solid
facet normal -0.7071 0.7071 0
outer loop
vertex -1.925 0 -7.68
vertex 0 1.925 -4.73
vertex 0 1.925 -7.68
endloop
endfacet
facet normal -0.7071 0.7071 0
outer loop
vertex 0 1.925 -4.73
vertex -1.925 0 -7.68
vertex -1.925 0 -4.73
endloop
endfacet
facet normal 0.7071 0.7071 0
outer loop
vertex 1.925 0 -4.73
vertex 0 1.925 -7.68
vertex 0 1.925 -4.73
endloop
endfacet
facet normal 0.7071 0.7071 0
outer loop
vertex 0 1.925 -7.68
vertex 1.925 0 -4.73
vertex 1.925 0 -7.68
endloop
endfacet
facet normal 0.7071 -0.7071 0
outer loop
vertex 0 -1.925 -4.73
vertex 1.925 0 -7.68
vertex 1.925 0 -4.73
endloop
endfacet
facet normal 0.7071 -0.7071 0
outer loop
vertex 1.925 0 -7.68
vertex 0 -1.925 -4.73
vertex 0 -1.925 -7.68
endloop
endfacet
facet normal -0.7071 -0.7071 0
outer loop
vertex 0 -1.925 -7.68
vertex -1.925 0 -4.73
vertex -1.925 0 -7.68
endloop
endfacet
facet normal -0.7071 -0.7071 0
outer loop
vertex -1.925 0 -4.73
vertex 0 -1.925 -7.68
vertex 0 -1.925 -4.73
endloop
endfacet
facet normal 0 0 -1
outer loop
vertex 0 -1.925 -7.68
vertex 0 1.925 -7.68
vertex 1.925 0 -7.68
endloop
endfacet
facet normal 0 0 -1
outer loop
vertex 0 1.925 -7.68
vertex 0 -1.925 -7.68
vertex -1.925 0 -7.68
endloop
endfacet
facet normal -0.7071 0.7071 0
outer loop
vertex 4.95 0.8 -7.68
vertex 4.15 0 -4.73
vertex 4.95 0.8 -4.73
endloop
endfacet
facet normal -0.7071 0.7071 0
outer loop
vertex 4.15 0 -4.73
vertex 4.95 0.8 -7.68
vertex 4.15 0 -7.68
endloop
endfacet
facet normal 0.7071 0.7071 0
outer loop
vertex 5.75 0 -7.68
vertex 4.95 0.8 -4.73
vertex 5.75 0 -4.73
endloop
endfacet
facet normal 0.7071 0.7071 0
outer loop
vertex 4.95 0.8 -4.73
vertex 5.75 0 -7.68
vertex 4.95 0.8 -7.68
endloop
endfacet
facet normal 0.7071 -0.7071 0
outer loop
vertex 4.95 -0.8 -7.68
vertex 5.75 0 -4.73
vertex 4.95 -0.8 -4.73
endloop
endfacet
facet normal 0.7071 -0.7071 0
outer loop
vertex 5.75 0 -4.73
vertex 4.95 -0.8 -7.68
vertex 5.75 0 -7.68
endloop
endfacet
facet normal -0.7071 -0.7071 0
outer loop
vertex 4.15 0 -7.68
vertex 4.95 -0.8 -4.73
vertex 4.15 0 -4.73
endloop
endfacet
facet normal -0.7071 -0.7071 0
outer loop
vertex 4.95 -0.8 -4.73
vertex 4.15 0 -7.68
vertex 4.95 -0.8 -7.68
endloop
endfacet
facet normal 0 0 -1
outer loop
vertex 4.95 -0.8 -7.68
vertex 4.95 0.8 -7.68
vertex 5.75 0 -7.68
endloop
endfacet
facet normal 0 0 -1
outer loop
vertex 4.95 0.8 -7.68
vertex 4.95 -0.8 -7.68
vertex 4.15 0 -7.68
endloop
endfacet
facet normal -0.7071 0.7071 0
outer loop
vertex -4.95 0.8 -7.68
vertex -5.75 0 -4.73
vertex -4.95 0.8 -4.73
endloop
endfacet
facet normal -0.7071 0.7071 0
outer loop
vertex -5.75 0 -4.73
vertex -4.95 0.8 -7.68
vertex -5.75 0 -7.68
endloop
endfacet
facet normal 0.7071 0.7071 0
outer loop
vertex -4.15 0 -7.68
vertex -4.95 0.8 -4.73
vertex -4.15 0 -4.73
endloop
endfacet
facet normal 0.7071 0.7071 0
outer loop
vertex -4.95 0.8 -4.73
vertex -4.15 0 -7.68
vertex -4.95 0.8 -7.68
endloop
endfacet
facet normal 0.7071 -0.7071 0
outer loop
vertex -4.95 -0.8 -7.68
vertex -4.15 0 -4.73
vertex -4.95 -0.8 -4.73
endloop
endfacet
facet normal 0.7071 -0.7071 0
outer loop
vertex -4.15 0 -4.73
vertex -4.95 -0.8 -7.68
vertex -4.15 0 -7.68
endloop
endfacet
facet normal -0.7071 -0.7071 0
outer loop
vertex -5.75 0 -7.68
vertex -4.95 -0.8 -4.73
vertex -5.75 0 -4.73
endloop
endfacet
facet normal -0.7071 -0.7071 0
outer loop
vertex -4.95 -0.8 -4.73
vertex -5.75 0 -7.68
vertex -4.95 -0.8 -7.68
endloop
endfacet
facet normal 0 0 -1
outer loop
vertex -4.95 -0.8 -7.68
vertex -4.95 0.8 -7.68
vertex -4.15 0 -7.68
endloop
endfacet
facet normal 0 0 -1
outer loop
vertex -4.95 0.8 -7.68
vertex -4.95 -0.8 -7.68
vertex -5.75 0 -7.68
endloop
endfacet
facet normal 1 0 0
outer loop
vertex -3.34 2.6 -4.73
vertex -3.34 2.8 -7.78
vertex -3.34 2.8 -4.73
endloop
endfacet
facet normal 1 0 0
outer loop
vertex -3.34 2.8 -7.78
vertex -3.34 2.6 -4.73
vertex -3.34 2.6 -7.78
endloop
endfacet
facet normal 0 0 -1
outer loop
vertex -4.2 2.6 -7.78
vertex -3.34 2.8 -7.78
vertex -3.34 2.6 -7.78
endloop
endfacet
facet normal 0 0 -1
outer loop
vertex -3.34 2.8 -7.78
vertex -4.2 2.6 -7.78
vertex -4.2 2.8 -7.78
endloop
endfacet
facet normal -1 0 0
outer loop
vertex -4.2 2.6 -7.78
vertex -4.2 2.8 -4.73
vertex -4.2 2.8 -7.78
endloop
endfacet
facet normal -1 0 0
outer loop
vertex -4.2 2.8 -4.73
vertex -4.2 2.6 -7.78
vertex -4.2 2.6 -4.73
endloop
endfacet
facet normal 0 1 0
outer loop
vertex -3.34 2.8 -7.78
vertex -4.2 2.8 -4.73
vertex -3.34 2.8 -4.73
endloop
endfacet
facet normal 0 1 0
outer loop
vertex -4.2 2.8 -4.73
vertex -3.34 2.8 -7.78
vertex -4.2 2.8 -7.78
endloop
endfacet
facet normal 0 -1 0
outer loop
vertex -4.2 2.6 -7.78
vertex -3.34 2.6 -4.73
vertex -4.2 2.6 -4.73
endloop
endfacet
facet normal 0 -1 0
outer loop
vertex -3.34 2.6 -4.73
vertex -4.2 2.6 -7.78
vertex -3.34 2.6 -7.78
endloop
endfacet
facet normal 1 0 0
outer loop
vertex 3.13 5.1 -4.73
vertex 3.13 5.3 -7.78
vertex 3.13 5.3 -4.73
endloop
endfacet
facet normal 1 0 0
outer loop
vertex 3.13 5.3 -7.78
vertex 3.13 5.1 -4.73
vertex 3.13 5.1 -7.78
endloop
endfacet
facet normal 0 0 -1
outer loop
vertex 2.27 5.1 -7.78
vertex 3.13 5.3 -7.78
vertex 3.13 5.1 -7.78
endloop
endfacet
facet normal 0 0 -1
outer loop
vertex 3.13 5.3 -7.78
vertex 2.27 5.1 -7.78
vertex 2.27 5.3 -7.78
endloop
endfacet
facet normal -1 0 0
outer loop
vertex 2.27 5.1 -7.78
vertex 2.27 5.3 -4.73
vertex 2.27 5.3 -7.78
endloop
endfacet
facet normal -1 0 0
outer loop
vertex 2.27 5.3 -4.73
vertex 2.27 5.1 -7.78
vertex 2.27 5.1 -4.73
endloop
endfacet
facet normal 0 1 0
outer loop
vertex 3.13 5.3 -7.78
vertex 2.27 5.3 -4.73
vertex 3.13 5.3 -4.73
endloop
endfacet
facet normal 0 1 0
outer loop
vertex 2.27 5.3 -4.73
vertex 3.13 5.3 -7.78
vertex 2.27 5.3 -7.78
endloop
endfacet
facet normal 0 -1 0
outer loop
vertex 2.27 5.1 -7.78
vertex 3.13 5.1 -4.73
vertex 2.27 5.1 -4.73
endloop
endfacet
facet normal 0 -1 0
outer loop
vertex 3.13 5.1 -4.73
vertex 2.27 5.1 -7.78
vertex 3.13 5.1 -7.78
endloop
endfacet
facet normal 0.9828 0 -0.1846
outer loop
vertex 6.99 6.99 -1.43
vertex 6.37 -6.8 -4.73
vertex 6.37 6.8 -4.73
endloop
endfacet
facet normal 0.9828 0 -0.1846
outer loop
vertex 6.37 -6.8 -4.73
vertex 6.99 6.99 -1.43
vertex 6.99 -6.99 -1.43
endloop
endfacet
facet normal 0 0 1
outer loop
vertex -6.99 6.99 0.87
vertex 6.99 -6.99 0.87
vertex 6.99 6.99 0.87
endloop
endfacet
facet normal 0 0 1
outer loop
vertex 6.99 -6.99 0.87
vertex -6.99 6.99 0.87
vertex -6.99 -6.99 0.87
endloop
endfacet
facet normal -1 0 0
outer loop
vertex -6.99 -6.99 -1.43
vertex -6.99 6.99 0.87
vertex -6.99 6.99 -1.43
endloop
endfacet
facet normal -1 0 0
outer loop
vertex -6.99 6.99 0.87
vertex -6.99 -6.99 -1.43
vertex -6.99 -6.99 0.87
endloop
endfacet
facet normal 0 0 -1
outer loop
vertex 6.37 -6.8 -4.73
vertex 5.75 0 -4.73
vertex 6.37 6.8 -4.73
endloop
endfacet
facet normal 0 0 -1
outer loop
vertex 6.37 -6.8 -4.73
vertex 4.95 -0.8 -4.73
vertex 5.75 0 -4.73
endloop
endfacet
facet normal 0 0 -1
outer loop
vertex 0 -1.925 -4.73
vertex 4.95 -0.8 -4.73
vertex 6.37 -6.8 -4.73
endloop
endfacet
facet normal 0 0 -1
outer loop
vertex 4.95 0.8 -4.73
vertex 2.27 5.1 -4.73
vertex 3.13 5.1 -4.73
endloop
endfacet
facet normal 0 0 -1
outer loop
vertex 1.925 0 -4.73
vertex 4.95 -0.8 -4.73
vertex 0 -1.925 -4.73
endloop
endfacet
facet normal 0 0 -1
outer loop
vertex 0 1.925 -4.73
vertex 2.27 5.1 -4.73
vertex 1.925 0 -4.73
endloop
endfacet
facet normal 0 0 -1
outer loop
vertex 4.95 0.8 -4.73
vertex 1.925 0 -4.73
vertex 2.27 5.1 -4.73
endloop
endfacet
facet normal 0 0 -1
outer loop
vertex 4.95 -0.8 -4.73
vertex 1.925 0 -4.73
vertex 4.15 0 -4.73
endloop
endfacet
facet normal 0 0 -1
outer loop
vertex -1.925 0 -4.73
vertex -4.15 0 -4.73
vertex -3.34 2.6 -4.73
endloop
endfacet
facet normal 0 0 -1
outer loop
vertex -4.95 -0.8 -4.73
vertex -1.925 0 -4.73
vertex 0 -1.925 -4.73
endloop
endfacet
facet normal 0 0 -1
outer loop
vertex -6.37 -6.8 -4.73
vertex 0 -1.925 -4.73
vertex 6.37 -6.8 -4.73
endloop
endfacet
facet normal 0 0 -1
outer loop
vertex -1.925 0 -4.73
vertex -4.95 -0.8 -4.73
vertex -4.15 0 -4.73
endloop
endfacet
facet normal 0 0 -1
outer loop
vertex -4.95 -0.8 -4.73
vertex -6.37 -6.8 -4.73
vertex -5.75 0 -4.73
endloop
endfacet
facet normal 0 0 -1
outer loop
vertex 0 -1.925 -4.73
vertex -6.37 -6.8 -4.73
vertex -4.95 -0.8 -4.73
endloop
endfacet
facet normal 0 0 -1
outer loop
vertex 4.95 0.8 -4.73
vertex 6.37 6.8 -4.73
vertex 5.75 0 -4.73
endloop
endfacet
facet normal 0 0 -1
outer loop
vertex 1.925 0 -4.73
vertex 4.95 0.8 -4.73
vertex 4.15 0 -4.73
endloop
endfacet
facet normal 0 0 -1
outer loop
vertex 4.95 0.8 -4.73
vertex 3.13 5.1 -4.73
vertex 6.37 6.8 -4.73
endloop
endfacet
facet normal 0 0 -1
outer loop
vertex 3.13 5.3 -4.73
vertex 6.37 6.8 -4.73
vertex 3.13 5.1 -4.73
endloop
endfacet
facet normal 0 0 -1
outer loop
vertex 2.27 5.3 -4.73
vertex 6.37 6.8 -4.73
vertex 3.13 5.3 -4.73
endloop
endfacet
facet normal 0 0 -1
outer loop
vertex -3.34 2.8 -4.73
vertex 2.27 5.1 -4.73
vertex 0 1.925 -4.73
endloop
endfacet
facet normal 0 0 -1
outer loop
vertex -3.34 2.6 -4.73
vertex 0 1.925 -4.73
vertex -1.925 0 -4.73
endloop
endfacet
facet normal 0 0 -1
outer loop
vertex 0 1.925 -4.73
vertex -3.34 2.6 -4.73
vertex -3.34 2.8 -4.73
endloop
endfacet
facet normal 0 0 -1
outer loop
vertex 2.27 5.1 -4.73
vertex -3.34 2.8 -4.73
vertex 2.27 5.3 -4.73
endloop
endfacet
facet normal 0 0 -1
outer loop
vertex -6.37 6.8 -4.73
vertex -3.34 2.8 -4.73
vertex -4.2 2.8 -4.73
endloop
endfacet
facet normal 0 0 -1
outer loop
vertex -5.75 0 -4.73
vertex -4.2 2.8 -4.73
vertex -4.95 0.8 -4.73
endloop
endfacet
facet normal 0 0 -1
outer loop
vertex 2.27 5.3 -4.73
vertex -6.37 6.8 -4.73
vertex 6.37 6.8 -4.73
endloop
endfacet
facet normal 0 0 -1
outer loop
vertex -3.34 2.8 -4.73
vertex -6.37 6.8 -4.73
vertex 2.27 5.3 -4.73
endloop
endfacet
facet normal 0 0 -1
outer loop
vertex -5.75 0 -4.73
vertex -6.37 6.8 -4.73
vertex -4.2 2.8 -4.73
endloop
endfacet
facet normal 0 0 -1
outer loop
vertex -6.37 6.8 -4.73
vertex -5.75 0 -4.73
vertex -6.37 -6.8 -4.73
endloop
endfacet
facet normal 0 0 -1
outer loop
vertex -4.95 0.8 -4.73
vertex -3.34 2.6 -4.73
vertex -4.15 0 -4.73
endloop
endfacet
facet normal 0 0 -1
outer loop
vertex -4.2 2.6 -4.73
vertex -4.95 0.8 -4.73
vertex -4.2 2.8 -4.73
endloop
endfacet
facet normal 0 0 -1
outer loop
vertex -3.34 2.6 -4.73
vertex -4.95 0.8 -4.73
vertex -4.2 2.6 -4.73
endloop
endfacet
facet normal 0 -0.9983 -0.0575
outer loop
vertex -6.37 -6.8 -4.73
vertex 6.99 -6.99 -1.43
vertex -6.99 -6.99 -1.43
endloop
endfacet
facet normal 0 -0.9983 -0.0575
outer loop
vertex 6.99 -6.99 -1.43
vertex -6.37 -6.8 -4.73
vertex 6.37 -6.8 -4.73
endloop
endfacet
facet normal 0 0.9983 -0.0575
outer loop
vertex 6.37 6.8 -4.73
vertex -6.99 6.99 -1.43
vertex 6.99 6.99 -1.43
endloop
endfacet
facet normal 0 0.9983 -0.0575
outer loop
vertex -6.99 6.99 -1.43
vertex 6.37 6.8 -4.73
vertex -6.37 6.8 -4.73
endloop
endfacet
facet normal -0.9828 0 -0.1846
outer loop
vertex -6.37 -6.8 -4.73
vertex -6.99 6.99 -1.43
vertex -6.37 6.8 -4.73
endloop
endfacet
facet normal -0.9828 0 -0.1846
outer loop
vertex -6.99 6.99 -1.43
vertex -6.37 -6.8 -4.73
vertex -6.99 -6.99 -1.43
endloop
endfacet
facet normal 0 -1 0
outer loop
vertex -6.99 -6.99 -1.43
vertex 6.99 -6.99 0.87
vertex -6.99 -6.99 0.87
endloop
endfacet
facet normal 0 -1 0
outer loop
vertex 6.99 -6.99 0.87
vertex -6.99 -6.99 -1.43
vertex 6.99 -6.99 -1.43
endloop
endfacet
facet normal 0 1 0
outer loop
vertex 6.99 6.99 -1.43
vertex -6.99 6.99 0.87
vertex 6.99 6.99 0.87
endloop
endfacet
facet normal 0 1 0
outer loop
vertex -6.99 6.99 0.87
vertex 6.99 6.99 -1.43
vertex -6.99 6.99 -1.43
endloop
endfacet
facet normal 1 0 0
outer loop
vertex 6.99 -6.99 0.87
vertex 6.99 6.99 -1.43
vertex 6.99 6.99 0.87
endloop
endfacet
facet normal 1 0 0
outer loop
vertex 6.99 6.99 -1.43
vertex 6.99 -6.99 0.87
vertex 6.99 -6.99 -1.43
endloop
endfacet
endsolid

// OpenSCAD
$fn=60;
/**
Adapted from https://www.thingiverse.com/thing:421524/files
I've deleted additional faces from the STL version of this file in blender.
I'm keeping this around just as reference, in case any modifications need to be made.

a cherry mx switch.

most of the measurements done with a caliper. some taken from
http://geekhack.org/index.php?topic=47744.0

This is just to illustrate and to drop in a a gross reference. It is mostly artistic apart from the steam and mounting plate dimensions
*/

// move the whole thing 3mm to give the empty space in usual keycaps.
// that is, the extra space inside a keycap female connector.
// i do that since i create all my keycaps with 0,0,0 being the internal base of the keycap
translate([0,0,10.12])
{

	// 3. bottom
	color("green")
		// 3.1 main body volume
		hull(){
				translate([0,0,-4 -5.3]) //steam + top
					cube([13.98,13.98,0.1], center=true);
				translate([0,0,-4 -5.3 -2.2]) //steam + top + straigth part
					cube([13.98,13.98,0.1], center=true);
				translate([0,0,-4 -5.3 -5.5]) //steam + top + bottom (measured 5.5)
					cube([12.74,13.6,0.1], center=true);
		}

		// 4. bottom guides
		// again, i'm assuming everything is centered...
		color("darkGreen"){
			// 4.1 cylinder
			translate([0,0,-4 -5.3 -5.5 -2/2]) //steam + top + bottom (measured 5.5)
				cylinder(r=3.85/2, h=4, center=true, $fn=4);
			// 4.2 PCB pins
			translate([4.95,0,-4 -5.3 -5.5 -2/2]) //steam + top + bottom (measured 5.5)
				cylinder(r=1.6/2, h=4, center=true, $fn=4);
			translate([-4.95,0,-4 -5.3 -5.5 -2/2]) //steam + top + bottom (measured 5.5)
				cylinder(r=1.6/2, h=4, center=true, $fn=4);
		}

		// 5. pins
		color("orange"){
			translate([-3.77,2.7,-4 -5.3 -5.5 -3.1/2]) //steam + top + bottom (measured 5.5)
				cube([.86, 0.2,3.1], center=true);
			translate([2.7,5.2,-4 -5.3 -5.5 -3.1/2]) //steam + top + bottom (measured 5.5)
				cube([.86, 0.2,3.1], center=true);
		}

}
